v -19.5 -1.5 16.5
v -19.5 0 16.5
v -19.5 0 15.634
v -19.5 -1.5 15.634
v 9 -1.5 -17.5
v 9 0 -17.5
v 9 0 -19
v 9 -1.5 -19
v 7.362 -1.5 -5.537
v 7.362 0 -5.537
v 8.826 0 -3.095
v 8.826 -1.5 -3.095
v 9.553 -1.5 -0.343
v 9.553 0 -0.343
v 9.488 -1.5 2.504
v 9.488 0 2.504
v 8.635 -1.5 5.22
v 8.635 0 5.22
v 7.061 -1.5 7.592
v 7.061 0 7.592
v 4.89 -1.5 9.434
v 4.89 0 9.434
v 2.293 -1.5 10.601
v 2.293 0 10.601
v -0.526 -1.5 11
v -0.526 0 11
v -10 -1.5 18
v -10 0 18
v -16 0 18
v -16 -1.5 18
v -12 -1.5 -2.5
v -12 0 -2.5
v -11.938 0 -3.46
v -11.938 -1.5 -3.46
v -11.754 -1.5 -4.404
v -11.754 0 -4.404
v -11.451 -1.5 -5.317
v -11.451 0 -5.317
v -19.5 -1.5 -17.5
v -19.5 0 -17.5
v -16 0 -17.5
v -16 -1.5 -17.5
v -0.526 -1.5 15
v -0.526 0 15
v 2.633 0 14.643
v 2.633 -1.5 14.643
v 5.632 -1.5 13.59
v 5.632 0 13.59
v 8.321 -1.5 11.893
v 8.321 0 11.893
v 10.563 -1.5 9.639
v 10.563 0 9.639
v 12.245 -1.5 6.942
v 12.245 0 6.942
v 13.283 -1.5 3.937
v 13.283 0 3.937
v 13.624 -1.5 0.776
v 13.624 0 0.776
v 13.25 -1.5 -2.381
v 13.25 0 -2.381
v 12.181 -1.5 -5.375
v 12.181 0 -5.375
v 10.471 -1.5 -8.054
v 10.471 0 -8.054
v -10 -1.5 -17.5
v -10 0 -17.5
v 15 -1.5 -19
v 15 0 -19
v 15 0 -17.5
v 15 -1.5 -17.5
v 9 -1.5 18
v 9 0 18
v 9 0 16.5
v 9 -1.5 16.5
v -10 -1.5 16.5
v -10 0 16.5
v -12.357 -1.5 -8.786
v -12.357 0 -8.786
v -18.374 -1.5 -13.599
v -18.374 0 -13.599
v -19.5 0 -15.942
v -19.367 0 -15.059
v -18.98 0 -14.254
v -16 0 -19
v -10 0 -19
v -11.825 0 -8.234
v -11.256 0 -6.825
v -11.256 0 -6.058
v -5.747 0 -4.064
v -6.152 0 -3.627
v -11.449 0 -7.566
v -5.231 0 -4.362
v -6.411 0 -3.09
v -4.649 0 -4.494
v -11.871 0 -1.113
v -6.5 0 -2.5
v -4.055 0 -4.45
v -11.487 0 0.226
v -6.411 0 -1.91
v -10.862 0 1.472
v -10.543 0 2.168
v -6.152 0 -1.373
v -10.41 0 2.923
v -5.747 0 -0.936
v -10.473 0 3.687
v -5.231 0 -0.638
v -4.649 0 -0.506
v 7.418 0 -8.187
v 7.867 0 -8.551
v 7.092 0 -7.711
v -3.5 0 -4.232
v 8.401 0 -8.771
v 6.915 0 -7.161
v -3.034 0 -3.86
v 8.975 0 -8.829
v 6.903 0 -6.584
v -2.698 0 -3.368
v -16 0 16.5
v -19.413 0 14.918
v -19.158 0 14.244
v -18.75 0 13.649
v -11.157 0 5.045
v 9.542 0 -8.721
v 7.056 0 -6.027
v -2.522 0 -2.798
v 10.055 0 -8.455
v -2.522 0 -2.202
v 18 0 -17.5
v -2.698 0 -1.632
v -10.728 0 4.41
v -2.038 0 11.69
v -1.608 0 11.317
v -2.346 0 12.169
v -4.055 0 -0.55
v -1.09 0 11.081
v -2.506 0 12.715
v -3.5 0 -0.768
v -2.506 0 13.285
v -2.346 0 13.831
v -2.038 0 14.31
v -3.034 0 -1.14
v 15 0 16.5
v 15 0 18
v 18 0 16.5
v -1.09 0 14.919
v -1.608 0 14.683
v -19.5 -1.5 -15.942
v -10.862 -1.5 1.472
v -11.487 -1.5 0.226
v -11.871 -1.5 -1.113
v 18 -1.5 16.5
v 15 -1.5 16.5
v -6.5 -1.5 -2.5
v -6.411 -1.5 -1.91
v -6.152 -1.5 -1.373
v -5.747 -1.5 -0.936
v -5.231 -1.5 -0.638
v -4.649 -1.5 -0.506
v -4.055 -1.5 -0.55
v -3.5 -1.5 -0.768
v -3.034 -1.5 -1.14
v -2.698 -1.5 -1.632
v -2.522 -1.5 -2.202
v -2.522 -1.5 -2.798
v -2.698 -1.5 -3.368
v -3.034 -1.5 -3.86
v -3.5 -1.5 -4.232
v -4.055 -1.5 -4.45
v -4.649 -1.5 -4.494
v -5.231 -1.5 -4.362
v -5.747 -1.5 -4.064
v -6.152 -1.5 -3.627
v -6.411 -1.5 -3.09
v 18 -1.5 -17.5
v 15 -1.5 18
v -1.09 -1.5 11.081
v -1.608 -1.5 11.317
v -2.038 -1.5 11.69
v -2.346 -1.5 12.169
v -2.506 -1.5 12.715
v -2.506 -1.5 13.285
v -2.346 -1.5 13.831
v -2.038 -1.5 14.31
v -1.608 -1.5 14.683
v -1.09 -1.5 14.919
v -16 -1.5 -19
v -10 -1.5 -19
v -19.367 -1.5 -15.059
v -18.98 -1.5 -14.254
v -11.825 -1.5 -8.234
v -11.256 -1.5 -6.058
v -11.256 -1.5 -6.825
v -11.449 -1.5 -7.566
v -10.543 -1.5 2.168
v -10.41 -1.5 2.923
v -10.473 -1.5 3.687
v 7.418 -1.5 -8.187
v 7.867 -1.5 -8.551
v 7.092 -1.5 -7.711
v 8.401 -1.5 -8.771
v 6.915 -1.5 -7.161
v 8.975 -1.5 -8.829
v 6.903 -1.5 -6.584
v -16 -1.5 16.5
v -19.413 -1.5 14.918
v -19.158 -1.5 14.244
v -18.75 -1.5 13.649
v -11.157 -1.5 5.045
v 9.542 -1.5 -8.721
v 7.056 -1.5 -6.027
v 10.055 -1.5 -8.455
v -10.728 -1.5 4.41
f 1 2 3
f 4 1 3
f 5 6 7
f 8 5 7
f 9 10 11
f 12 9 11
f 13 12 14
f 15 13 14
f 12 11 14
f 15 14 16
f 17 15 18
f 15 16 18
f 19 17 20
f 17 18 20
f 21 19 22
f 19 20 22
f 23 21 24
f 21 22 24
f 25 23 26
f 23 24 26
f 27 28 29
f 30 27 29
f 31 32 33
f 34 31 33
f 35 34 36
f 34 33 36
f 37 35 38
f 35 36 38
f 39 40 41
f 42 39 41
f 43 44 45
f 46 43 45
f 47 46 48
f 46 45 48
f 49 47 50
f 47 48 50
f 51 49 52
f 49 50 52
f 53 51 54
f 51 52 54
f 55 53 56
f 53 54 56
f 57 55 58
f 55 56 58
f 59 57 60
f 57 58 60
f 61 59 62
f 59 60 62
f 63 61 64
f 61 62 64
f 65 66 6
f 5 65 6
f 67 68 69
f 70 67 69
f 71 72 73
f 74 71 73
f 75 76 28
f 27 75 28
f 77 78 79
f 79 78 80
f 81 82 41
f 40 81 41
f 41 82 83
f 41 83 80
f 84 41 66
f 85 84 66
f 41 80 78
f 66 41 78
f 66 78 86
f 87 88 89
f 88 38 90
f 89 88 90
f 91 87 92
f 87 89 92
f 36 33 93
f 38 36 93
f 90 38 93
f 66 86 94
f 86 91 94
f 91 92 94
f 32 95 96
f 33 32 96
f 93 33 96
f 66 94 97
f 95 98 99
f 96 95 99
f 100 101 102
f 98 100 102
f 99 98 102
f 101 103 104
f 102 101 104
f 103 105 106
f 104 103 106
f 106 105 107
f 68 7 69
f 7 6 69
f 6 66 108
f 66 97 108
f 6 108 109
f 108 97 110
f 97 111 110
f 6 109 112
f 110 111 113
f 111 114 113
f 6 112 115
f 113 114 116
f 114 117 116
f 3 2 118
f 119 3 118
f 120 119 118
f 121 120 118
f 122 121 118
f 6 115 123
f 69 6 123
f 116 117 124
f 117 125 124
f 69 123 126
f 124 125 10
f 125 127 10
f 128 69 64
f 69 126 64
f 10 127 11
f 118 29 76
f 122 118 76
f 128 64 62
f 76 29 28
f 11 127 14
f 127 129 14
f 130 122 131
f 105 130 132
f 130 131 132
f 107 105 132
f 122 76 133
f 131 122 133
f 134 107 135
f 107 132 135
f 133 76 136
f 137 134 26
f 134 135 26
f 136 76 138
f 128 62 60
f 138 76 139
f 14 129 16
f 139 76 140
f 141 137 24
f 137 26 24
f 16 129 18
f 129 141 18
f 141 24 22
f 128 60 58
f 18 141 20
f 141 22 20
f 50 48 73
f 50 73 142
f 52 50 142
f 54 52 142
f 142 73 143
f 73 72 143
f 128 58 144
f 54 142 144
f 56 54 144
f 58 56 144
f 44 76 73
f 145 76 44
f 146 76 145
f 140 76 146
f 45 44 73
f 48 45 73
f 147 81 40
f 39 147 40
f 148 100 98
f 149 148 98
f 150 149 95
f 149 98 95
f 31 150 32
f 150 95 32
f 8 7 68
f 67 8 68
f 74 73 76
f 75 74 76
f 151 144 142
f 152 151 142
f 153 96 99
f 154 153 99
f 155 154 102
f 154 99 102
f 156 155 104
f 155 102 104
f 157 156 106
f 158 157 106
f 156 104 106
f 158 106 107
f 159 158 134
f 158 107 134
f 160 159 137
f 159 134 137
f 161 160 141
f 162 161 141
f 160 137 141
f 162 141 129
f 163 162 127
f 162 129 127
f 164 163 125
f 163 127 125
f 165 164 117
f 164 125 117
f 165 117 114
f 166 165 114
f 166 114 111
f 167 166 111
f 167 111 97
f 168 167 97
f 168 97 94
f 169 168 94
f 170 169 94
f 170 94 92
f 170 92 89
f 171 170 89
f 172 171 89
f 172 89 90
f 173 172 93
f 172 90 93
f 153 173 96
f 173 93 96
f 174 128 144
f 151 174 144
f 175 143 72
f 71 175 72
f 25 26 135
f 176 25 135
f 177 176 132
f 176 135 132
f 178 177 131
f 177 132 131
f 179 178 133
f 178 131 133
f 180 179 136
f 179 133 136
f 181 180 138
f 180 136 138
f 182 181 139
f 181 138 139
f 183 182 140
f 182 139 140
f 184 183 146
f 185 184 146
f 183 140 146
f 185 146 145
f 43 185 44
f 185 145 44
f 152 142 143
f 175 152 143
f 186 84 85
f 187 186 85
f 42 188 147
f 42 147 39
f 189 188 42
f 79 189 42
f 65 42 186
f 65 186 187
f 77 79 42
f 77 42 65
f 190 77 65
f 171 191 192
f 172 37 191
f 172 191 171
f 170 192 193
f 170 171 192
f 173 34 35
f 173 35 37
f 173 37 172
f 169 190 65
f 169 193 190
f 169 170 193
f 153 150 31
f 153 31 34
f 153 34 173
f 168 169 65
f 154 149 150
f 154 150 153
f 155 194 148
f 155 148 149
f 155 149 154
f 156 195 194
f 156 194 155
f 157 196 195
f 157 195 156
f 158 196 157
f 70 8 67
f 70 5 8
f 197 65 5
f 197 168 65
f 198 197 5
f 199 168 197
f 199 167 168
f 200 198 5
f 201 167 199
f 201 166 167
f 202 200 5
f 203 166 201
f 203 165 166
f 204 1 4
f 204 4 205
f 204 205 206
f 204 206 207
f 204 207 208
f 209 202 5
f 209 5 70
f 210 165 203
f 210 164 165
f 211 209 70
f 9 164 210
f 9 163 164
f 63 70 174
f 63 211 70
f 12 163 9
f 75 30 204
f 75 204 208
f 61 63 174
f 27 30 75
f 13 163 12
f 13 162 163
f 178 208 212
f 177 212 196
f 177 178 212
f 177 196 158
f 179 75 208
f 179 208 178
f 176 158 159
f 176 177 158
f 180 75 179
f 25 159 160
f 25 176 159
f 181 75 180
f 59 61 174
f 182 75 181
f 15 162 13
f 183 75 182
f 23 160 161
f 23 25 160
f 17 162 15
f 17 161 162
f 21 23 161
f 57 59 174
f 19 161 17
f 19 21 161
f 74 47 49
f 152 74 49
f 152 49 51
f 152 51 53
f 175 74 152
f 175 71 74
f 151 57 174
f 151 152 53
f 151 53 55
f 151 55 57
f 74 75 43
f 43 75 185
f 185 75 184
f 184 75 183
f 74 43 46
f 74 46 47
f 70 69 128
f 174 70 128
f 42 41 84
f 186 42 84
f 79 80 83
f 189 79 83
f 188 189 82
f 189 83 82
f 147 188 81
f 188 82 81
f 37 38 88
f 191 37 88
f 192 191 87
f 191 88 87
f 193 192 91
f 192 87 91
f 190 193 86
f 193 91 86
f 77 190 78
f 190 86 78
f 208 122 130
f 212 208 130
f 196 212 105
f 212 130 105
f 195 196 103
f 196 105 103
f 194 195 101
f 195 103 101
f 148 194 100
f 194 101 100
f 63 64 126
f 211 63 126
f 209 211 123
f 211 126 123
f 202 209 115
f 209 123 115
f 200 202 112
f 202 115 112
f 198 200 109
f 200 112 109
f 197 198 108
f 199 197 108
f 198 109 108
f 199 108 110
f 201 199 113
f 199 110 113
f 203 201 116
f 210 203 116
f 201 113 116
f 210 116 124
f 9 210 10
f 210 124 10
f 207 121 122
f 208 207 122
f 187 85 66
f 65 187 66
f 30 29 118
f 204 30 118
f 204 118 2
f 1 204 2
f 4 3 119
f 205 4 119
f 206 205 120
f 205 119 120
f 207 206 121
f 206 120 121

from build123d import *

# Parameters (mm, degrees)
F1_DEPTH = 1.5


with BuildPart() as f1:
    # F0 (on Front) → F1 (new body)
    with BuildSketch(Plane.XZ):
        with BuildLine():
            Line((9, -19), (15, -19))
            Line((15, -19), (15, -17.5))
            Line((15, -17.5), (18, -17.5))
            Line((18, -17.5), (18, 16.5))
            Line((18, 16.5), (15, 16.5))
            Line((15, 16.5), (15, 18))
            Line((15, 18), (9, 18))
            Line((9, 18), (9, 16.5))
            Line((9, 16.5), (-10, 16.5))
            Line((-10, 16.5), (-10, 18))
            Line((-10, 18), (-16, 18))
            Line((-16, 18), (-16, 16.5))
            Line((-16, 16.5), (-19.5, 16.5))
            Line((-19.5, 16.5), (-19.5, 15.634314))
            ThreePointArc((-19.5, 15.634314), (-19.306113, 14.57331), (-18.749514, 13.649449))
            Line((-18.749514, 13.649449), (-11.157439, 5.045098))
            ThreePointArc((-11.157439, 5.045098), (-10.417146, 3.307324), (-10.862109, 1.471595))
            ThreePointArc((-10.862109, 1.471595), (-11.709917, -0.434306), (-12, -2.5))
            ThreePointArc((-12, -2.5), (-11.861475, -3.93481), (-11.451019, -5.316619))
            ThreePointArc((-11.451019, -5.316619), (-11.32884, -7.20155), (-12.357341, -8.785873))
            Line((-12.357341, -8.785873), (-18.374085, -13.599268))
            ThreePointArc((-18.374085, -13.599268), (-19.20391, -14.642308), (-19.5, -15.941875))
            Line((-19.5, -15.941875), (-19.5, -17.5))
            Line((-19.5, -17.5), (-16, -17.5))
            Line((-16, -17.5), (-16, -19))
            Line((-16, -19), (-10, -19))
            Line((-10, -19), (-10, -17.5))
            Line((-10, -17.5), (9, -17.5))
            Line((9, -17.5), (9, -19))
        make_face()
        with BuildLine():
            ThreePointArc((-2.5, -2.5), (-4.5, -4.5), (-6.5, -2.5))
            ThreePointArc((-6.5, -2.5), (-4.5, -0.5), (-2.5, -2.5))
        make_face(mode=Mode.SUBTRACT)
        with BuildLine():
            ThreePointArc((10.470654, -8.054456), (7.629322, -8.385303), (7.361973, -5.537295))
            ThreePointArc((7.361973, -5.537295), (8.634848, 5.219866), (-0.526307, 11))
            ThreePointArc((-0.526307, 11), (-2.526307, 13), (-0.526307, 15))
            ThreePointArc((-0.526307, 15), (12.245156, 6.94198), (10.470654, -8.054456))
        make_face(mode=Mode.SUBTRACT)
    extrude(amount=F1_DEPTH)


solid = f1.part
